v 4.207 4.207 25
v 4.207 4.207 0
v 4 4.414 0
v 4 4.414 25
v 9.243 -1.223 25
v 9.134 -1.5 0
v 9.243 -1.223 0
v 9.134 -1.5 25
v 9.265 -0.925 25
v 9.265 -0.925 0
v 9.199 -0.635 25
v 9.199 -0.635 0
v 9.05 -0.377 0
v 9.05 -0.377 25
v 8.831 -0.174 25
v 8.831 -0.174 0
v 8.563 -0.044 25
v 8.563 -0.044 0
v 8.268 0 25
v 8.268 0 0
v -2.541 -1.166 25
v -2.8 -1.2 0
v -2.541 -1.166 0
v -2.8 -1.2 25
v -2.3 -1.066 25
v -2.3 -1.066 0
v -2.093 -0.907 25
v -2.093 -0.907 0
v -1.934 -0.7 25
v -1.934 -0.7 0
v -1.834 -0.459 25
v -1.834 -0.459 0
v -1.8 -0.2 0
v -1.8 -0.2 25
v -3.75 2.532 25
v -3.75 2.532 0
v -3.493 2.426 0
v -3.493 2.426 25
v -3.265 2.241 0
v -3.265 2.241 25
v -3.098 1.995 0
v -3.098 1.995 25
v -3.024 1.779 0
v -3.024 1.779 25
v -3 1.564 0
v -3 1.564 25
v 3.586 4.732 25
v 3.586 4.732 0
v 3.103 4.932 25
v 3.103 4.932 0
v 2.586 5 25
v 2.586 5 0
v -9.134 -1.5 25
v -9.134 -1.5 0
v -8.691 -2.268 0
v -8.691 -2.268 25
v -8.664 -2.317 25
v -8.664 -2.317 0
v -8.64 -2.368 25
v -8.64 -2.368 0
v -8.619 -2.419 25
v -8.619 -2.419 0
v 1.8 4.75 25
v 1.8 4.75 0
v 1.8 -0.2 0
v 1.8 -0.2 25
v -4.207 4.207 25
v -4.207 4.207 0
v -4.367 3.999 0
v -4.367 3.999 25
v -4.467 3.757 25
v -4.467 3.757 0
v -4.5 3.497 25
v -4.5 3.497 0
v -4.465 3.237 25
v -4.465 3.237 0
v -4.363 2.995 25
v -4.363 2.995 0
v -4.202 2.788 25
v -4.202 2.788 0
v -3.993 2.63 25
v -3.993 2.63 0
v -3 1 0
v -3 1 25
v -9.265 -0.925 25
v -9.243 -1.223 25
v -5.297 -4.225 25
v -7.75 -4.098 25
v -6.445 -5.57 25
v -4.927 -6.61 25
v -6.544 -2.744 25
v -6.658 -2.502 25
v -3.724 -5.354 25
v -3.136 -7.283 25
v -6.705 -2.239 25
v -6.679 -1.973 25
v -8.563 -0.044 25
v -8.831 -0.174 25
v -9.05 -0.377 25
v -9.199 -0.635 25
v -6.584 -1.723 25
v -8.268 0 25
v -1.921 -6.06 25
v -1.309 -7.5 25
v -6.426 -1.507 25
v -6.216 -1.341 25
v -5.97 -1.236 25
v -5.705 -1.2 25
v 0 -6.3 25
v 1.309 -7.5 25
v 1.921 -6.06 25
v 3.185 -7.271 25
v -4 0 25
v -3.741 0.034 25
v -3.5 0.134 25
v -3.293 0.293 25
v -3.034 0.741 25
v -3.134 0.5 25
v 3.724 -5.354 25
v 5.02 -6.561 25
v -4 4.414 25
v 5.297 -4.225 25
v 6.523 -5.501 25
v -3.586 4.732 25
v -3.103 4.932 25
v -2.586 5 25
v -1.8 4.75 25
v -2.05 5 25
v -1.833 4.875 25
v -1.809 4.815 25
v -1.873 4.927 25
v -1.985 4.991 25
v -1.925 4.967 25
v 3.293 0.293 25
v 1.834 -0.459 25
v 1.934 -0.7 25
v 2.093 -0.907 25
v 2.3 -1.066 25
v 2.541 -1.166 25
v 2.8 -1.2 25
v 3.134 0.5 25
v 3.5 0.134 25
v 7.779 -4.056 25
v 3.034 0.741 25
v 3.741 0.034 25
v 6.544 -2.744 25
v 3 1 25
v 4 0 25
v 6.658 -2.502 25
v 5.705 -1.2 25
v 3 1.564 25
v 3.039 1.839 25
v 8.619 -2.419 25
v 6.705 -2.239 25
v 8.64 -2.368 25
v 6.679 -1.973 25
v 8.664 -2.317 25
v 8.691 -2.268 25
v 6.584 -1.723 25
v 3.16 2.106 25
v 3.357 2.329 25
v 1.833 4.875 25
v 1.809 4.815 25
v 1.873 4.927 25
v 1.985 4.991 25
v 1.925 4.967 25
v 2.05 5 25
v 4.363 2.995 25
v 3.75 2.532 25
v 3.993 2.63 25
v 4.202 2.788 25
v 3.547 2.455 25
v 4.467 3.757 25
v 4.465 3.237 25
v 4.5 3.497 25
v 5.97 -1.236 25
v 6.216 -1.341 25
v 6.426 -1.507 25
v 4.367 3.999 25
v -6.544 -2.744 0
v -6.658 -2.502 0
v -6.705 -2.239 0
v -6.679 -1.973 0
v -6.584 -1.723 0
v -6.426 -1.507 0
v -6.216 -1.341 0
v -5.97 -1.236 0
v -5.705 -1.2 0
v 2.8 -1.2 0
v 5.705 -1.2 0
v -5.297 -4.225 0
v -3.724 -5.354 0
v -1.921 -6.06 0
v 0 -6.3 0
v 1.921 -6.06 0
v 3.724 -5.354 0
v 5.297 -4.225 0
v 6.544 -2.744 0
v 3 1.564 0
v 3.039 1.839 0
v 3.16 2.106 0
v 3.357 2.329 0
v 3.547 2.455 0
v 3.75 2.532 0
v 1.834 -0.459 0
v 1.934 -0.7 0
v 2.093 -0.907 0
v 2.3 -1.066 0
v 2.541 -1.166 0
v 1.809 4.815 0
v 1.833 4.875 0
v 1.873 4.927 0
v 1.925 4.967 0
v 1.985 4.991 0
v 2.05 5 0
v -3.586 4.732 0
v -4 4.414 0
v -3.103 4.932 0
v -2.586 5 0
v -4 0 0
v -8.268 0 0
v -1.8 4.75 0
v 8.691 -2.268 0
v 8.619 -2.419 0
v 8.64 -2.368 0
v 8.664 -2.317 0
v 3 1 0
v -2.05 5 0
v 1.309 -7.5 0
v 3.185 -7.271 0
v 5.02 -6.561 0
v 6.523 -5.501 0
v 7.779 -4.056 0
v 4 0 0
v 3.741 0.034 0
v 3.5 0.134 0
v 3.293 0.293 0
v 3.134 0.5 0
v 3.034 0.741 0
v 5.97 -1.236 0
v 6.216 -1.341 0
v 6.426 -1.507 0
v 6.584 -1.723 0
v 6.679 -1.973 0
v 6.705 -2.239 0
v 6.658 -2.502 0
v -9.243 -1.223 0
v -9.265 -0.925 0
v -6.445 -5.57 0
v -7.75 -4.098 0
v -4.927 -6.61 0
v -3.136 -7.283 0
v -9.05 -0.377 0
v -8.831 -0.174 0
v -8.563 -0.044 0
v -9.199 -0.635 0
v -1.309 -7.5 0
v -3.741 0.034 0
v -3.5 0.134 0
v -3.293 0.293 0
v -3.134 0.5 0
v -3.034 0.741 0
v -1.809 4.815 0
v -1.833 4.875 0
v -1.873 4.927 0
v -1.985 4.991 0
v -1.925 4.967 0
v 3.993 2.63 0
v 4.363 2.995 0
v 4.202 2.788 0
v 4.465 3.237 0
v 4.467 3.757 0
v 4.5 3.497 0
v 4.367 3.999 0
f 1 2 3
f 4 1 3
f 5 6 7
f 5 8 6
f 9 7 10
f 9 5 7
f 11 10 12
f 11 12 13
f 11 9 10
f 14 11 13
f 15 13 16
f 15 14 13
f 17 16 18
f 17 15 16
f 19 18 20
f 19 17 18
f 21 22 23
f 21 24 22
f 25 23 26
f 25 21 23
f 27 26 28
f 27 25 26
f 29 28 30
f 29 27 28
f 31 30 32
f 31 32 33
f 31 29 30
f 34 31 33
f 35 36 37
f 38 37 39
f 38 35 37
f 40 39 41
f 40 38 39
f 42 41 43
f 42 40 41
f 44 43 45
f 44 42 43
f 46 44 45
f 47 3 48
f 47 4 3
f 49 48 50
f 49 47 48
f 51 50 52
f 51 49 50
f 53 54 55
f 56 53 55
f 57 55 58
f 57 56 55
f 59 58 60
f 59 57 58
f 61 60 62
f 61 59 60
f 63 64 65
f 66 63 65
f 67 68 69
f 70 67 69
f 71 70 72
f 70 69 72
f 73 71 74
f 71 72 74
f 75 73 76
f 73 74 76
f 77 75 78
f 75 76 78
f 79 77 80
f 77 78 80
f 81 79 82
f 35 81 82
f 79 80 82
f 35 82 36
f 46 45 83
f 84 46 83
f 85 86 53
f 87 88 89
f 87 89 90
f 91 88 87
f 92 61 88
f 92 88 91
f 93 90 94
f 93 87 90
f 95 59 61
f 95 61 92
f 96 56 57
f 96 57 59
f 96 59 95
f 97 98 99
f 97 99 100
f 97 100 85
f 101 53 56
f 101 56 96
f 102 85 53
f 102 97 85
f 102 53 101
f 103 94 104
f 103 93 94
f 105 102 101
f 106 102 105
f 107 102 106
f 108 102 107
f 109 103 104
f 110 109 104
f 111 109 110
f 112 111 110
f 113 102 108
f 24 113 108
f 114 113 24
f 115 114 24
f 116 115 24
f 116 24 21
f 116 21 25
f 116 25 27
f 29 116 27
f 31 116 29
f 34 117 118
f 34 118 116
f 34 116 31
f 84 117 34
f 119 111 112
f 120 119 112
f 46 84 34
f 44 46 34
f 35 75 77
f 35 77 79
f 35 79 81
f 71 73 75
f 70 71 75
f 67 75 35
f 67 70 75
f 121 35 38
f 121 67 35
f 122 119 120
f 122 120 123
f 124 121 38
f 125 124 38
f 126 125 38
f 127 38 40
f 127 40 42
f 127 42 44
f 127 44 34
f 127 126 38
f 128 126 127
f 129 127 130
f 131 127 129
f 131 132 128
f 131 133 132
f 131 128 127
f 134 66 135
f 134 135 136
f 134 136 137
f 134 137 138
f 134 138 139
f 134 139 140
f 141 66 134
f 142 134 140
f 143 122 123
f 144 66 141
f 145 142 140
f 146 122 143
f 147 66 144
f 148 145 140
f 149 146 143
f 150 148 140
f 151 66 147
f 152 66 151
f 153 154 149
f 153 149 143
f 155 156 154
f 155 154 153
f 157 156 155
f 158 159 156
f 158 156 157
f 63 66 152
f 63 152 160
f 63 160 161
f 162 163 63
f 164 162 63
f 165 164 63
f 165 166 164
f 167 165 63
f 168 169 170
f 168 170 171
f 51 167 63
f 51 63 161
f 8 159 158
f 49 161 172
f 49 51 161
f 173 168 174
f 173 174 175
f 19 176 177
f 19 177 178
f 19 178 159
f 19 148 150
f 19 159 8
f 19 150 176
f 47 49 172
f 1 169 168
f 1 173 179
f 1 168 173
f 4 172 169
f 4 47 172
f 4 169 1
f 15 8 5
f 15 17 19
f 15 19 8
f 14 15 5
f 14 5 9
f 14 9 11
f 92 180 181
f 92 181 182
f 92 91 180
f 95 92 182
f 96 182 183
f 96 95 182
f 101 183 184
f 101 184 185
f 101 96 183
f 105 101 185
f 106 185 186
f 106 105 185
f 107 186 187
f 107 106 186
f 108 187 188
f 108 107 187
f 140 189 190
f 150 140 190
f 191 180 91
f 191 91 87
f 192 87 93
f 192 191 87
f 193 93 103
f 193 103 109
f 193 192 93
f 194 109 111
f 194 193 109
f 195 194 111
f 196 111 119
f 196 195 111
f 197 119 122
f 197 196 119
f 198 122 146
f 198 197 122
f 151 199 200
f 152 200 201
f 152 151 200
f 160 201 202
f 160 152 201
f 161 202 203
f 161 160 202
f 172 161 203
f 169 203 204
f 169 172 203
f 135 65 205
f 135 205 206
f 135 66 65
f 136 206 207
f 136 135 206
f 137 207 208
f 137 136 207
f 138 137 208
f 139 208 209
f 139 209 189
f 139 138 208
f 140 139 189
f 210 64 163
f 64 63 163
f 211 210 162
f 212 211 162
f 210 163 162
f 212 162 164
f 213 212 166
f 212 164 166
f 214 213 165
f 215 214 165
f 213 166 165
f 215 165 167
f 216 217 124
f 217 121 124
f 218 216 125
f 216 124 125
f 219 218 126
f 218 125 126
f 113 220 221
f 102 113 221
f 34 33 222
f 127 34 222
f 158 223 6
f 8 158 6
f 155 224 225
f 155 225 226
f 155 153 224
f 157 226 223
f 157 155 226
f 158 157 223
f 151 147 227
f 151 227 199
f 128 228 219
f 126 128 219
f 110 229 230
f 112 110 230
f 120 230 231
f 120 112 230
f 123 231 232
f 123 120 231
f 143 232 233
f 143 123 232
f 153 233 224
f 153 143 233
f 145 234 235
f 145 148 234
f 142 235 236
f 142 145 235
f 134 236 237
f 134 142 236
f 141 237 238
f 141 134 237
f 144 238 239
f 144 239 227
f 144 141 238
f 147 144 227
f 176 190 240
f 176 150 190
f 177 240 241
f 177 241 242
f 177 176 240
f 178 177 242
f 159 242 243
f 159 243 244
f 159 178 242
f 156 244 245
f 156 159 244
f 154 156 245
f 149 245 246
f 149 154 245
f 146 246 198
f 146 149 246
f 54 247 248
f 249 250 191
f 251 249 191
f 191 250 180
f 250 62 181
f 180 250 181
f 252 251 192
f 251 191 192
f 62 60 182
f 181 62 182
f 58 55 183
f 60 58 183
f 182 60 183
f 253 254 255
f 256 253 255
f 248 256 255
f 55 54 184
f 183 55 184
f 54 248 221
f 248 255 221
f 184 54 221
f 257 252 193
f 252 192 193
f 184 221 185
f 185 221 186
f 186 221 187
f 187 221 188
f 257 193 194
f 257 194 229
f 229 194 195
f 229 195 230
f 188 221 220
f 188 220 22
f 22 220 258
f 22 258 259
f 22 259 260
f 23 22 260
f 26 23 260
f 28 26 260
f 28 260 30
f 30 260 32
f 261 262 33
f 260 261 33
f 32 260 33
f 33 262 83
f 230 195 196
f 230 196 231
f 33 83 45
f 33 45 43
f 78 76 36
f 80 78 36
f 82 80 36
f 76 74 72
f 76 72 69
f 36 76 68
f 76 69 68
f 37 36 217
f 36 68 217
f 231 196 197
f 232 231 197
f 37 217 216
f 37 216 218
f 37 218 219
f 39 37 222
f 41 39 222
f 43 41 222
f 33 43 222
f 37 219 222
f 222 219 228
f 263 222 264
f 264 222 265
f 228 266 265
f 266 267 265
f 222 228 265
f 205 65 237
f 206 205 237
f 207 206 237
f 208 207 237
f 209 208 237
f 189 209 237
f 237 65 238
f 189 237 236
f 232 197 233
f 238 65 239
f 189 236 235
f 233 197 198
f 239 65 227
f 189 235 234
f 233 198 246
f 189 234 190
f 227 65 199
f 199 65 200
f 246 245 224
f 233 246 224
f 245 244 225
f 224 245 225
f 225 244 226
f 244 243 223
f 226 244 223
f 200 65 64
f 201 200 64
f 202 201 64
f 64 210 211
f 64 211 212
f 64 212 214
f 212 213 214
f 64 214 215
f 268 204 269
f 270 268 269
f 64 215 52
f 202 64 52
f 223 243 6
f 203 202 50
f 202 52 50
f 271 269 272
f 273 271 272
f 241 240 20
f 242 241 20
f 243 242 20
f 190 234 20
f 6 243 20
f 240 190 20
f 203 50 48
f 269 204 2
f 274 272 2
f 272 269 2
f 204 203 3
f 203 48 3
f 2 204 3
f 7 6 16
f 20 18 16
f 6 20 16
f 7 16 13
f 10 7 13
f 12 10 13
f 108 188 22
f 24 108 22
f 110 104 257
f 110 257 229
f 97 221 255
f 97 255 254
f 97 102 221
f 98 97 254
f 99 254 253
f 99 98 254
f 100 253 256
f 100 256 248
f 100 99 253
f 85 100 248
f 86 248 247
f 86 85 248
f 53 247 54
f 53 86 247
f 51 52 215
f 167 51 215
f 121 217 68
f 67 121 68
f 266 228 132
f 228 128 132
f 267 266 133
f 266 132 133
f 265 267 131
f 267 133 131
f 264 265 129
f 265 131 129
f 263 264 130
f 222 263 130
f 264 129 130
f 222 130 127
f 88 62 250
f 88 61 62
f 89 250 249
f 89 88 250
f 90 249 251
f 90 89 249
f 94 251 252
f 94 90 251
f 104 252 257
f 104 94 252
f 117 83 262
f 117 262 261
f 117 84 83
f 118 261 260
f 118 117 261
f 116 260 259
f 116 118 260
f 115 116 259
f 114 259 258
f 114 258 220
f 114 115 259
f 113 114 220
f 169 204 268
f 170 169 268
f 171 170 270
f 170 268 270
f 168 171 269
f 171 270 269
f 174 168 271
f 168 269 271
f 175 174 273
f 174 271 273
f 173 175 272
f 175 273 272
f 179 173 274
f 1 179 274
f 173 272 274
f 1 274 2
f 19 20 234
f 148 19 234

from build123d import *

# Parameters (mm, degrees)
PAD_DEPTH   = 25
FILLET_R    = 1
FILLET001_R = 7.8
FILLET002_R = 2
FILLET003_R = 0.25


with BuildPart() as part:
    # Sketch → Pad (new body)
    with BuildSketch(Plane.XY):
        with BuildLine():
            Line((-1.8, 5), (-3.414214, 5))
            Line((-3.414214, 5), (-4.207107, 4.207107))
            ThreePointArc((-4.207107, 4.207107), (-4.42388, 3.117317), (-3.5, 2.5))
            Line((-3.5, 2.5), (-3, 2.5))
            Line((-3, 2.5), (-3, 0))
            Line((-3, 0), (-10, 0))
            Line((-10, 0), (-8.556624, -2.5))
            Line((-8.556624, -2.5), (-8.556624, -7.5))
            Line((-8.556624, -7.5), (8.556624, -7.5))
            Line((8.556624, -7.5), (8.556624, -2.5))
            Line((8.556624, -2.5), (10, 0))
            Line((10, 0), (3, 0))
            Line((3, 0), (3, 2.5))
            Line((3, 2.5), (3.5, 2.5))
            ThreePointArc((3.5, 2.5), (4.42388, 3.117317), (4.207107, 4.207107))
            Line((4.207107, 4.207107), (3.414214, 5))
            Line((3.414214, 5), (1.8, 5))
            Line((1.8, 5), (1.8, -1.2))
            Line((1.8, -1.2), (7.317787, -1.2))
            ThreePointArc((-7.317787, -1.2), (0, -6.3), (7.317787, -1.2))
            Line((-7.317787, -1.2), (-1.8, -1.2))
            Line((-1.8, -1.2), (-1.8, 5))
        make_face()
    extrude(amount=PAD_DEPTH)

    # Fillet
    fillet_edges = [part.edges().sort_by_distance(p)[0] for p in [
        (-8.556624, -2.5, 12.5),
        (8.556624, -2.5, 12.5),
        (10, 0, 12.5),
        (-10, 0, 12.5),
        (7.317787, -1.2, 12.5),
        (-7.317787, -1.2, 12.5),
        (1.8, -1.2, 12.5),
        (-1.8, -1.2, 12.5),
        (3, 0, 12.5),
        (-3, 0, 12.5),
        (3, 2.5, 12.5),
        (-3, 2.5, 12.5),
    ]]
    fillet(fillet_edges, radius=FILLET_R)

    # Fillet001
    fillet001_edges = [part.edges().sort_by_distance(p)[0] for p in [
        (-8.556624, -7.5, 12.5),
        (8.556624, -7.5, 12.5),
    ]]
    fillet(fillet001_edges, radius=FILLET001_R)

    # Fillet002
    fillet002_edges = [part.edges().sort_by_distance(p)[0] for p in [
        (-3.414214, 5, 12.5),
        (3.414214, 5, 12.5),
    ]]
    fillet(fillet002_edges, radius=FILLET002_R)

    # Fillet003
    fillet003_edges = [part.edges().sort_by_distance(p)[0] for p in [
        (-1.8, 5, 12.5),
        (1.8, 5, 12.5),
    ]]
    fillet(fillet003_edges, radius=FILLET003_R)


solid = part.part
